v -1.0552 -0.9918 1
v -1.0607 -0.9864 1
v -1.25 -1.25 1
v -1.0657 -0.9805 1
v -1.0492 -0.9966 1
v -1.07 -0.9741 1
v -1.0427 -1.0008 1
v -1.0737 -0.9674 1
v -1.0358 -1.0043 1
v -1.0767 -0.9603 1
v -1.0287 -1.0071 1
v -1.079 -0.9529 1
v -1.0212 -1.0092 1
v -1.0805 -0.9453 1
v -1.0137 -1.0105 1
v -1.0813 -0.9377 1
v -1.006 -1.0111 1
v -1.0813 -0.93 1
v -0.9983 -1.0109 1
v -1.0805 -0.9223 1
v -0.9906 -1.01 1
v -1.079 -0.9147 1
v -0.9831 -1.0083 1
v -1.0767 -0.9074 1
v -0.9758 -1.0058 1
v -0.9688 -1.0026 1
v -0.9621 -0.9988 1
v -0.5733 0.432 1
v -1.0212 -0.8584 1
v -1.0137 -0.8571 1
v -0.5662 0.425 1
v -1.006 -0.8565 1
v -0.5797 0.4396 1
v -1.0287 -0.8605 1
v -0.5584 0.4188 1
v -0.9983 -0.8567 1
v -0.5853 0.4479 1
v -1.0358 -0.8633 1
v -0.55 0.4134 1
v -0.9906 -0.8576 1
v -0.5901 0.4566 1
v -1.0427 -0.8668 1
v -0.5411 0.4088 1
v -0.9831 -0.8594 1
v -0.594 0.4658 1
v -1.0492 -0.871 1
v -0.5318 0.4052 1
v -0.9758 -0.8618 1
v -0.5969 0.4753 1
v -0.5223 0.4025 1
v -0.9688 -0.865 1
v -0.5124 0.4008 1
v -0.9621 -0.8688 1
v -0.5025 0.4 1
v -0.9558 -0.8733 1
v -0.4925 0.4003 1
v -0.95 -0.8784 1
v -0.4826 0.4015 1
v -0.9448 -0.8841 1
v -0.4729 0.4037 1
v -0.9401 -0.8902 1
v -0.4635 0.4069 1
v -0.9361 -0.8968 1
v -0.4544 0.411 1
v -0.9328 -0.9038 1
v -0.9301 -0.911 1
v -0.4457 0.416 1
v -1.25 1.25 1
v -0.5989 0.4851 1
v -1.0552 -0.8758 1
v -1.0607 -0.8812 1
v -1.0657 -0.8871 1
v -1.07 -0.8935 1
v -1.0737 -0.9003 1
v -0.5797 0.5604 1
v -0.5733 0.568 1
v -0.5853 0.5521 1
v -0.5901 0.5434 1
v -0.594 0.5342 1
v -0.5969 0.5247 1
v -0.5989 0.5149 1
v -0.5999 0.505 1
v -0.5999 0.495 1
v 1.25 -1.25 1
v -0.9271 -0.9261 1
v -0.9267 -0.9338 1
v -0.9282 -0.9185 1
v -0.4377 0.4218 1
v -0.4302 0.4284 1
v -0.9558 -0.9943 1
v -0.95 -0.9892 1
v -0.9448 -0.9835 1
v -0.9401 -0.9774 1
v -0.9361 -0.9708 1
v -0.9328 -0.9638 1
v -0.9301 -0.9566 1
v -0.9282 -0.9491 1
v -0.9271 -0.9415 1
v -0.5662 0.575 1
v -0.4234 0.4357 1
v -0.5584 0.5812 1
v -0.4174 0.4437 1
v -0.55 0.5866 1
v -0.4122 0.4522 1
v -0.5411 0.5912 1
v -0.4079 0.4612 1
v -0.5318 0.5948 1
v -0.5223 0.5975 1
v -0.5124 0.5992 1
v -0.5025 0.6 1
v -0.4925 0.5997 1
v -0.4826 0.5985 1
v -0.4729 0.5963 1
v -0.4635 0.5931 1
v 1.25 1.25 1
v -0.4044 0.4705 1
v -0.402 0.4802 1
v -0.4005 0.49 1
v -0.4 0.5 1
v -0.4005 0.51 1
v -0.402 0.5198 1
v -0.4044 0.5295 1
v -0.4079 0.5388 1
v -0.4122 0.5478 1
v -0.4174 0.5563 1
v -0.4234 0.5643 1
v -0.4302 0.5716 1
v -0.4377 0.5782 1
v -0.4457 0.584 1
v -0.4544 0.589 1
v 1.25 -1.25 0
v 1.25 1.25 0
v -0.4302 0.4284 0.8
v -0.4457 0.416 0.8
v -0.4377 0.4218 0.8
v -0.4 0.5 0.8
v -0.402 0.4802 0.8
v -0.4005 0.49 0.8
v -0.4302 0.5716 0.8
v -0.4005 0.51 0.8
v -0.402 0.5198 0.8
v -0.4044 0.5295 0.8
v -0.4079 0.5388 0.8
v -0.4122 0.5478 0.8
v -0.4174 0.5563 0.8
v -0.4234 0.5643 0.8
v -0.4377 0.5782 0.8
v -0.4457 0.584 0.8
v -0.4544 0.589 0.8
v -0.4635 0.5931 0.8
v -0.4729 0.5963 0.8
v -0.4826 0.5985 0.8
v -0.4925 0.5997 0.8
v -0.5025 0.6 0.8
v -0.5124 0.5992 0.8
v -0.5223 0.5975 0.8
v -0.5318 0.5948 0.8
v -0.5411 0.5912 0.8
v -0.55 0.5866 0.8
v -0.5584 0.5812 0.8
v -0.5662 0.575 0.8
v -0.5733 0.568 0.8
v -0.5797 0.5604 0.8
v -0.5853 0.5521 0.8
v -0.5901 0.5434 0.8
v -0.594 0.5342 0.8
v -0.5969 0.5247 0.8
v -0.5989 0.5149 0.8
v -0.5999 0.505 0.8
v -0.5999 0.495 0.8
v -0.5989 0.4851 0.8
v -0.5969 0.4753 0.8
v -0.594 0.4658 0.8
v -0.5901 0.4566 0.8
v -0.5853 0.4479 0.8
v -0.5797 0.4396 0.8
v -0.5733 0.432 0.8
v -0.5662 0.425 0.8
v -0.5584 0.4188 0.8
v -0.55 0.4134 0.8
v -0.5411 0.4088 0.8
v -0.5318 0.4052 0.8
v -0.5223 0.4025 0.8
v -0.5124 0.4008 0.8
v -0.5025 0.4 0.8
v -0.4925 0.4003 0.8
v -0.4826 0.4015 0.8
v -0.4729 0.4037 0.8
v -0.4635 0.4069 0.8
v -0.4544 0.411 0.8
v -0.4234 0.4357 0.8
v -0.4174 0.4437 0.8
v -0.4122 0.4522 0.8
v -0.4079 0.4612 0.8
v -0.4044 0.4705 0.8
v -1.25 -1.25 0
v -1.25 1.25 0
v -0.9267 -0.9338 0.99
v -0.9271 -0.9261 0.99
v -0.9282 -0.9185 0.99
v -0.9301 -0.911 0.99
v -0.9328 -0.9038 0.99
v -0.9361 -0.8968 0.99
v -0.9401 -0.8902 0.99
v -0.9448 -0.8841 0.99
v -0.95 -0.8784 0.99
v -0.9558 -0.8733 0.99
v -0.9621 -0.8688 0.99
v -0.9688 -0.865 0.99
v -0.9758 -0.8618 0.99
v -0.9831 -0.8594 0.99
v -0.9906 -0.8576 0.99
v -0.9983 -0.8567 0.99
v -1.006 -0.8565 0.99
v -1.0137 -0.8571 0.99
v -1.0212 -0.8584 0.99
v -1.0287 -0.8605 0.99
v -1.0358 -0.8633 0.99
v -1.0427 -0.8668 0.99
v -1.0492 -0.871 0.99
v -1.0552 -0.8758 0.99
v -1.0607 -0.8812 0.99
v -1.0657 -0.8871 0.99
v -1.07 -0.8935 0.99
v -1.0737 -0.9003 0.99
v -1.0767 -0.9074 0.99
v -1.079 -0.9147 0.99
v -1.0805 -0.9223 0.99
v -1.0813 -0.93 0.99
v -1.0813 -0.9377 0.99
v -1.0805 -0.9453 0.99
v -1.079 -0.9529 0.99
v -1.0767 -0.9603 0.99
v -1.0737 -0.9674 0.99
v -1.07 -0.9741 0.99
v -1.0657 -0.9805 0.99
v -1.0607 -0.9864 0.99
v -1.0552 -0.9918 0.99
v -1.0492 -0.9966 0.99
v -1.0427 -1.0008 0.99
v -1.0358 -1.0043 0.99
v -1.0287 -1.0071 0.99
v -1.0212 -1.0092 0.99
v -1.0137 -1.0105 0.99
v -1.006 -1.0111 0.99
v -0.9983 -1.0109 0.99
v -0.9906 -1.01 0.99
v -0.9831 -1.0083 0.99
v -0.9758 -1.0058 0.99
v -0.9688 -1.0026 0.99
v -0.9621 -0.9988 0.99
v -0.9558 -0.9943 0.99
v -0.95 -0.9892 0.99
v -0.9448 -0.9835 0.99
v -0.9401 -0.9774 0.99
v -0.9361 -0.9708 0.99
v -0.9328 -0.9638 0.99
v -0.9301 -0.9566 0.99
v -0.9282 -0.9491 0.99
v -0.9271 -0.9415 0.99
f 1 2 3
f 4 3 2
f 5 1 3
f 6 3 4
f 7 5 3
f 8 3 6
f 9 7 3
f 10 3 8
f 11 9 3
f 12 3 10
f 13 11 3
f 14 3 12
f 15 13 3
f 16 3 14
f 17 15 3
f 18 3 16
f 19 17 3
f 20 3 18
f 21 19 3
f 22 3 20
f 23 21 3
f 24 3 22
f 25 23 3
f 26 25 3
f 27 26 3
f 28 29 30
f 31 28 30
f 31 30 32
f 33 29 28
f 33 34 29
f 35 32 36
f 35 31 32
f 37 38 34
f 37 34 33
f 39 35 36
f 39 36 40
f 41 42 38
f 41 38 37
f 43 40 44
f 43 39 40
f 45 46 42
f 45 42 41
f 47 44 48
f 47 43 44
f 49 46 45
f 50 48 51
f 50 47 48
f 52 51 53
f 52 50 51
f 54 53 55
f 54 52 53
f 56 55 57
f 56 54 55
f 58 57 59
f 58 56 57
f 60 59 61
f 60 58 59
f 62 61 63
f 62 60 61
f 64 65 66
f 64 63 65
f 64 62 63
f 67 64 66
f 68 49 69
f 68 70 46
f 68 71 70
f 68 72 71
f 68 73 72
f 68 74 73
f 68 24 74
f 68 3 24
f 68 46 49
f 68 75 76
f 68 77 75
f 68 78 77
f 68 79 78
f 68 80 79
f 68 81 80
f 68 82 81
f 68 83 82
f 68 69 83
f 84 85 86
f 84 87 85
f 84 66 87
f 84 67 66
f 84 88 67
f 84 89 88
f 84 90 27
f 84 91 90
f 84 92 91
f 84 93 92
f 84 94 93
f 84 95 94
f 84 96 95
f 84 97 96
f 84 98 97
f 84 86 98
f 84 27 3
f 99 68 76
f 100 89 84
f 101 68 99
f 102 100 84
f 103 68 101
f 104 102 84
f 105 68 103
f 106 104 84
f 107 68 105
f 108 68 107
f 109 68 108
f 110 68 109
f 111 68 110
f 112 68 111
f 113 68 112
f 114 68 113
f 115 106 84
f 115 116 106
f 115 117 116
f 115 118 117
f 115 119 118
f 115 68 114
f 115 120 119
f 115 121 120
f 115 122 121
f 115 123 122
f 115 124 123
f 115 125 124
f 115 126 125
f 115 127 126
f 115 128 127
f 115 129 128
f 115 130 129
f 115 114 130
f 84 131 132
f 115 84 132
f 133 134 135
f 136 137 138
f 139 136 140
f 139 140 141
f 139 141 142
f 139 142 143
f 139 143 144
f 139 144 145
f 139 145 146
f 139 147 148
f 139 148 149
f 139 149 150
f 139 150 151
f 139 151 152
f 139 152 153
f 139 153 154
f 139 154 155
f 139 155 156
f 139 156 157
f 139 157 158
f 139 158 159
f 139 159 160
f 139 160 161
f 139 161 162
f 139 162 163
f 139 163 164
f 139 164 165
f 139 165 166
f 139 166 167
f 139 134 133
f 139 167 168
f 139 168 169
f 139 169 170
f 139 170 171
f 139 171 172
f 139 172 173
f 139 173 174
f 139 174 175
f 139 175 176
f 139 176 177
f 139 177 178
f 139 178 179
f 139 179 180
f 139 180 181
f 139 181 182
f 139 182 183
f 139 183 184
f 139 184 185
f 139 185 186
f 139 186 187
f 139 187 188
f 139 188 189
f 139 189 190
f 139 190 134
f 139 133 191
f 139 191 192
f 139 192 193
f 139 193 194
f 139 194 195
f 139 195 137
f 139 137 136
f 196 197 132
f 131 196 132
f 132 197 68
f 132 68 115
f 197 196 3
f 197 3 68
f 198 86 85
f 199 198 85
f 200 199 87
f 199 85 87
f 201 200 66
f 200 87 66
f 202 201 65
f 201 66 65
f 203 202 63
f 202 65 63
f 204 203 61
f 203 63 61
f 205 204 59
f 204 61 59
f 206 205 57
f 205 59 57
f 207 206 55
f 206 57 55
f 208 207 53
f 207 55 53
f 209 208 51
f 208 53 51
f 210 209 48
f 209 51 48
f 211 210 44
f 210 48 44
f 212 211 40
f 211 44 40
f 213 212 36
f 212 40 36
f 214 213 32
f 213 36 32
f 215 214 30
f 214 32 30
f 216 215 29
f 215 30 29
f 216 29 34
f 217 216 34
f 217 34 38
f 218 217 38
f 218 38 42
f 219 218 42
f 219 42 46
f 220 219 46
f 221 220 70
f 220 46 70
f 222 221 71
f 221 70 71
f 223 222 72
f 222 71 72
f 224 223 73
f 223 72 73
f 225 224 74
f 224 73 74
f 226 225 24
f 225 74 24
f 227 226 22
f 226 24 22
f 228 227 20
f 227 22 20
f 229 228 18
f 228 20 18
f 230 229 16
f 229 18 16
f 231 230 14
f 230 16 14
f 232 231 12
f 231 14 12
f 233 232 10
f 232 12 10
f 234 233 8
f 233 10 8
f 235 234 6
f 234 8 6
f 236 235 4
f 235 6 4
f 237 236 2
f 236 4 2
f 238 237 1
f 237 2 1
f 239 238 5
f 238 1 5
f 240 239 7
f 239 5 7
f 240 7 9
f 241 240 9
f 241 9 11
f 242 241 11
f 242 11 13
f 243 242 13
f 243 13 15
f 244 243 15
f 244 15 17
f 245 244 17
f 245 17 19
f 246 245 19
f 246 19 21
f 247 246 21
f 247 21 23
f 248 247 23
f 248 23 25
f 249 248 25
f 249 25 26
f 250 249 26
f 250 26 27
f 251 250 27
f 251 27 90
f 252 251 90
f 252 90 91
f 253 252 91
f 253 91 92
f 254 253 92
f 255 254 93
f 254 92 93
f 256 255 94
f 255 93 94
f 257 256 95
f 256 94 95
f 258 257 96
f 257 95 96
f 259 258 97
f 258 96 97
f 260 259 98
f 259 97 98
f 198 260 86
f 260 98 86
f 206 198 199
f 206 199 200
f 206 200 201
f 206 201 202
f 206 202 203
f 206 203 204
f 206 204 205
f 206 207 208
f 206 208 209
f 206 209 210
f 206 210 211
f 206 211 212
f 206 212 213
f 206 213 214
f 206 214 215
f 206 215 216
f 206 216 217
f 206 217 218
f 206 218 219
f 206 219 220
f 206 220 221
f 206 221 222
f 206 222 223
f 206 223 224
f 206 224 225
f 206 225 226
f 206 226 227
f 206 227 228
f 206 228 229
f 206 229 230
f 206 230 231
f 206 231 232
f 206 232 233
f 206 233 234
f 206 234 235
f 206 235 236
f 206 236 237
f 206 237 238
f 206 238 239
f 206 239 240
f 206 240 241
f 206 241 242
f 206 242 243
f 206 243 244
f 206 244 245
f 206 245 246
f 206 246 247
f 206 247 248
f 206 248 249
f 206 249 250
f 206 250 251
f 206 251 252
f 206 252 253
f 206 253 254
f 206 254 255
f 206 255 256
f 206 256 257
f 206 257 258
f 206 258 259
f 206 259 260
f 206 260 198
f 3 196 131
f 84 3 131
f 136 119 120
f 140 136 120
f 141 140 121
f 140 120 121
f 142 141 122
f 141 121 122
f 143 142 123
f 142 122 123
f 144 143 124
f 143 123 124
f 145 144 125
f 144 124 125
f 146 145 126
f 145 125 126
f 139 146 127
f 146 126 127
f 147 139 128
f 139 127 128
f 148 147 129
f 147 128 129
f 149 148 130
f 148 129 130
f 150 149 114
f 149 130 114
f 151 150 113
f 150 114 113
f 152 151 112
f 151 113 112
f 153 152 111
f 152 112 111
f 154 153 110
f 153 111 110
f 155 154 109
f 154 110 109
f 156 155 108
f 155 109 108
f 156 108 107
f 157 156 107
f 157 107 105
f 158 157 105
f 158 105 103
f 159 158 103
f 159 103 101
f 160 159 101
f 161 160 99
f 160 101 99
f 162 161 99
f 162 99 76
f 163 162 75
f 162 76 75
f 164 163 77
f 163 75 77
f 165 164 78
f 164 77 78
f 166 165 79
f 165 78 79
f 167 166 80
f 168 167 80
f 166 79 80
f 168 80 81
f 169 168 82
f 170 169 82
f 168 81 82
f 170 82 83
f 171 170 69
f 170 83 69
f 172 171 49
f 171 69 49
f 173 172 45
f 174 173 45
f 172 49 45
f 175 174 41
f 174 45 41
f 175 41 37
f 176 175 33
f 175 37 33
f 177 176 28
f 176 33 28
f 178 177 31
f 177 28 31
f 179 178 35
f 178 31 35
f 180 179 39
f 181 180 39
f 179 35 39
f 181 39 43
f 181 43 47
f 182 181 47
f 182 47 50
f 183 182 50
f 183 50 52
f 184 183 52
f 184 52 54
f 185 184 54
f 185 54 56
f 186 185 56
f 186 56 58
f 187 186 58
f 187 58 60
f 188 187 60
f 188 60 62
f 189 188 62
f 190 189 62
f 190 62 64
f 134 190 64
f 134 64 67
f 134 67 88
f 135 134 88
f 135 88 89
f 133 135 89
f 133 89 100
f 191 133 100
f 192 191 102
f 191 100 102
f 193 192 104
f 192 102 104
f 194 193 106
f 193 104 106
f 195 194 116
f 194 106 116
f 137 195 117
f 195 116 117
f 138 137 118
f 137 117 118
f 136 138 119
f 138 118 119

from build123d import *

# Parameters (mm, degrees)
SKETCH1_W           = 2.5
SKETCH1_H           = 2.5
BOSS_EXTRUDE1_DEPTH = 1
SKETCH2_R           = 0.1
CUT_EXTRUDE1_DEPTH  = 0.2
SKETCH3_R           = 0.077337361
CUT_EXTRUDE2_DEPTH  = 0.01


with BuildPart() as part:
    # Sketch1 → Boss-Extrude1 (new body)
    with BuildSketch(Plane.XY):
        Rectangle(SKETCH1_W, SKETCH1_H)
    extrude(amount=BOSS_EXTRUDE1_DEPTH)

    # Sketch2 → Cut-Extrude1 (cut)
    with BuildSketch(Plane.XY.offset(1)):
        with Locations((-0.5, 0.5)):
            Circle(SKETCH2_R)
    extrude(amount=-CUT_EXTRUDE1_DEPTH, mode=Mode.SUBTRACT)

    # Sketch3 → Cut-Extrude2 (cut)
    with BuildSketch(Plane.XY.offset(1)):
        with Locations((-1.004038856, -0.933808159)):
            Circle(SKETCH3_R)
    extrude(amount=-CUT_EXTRUDE2_DEPTH, mode=Mode.SUBTRACT)


solid = part.part
